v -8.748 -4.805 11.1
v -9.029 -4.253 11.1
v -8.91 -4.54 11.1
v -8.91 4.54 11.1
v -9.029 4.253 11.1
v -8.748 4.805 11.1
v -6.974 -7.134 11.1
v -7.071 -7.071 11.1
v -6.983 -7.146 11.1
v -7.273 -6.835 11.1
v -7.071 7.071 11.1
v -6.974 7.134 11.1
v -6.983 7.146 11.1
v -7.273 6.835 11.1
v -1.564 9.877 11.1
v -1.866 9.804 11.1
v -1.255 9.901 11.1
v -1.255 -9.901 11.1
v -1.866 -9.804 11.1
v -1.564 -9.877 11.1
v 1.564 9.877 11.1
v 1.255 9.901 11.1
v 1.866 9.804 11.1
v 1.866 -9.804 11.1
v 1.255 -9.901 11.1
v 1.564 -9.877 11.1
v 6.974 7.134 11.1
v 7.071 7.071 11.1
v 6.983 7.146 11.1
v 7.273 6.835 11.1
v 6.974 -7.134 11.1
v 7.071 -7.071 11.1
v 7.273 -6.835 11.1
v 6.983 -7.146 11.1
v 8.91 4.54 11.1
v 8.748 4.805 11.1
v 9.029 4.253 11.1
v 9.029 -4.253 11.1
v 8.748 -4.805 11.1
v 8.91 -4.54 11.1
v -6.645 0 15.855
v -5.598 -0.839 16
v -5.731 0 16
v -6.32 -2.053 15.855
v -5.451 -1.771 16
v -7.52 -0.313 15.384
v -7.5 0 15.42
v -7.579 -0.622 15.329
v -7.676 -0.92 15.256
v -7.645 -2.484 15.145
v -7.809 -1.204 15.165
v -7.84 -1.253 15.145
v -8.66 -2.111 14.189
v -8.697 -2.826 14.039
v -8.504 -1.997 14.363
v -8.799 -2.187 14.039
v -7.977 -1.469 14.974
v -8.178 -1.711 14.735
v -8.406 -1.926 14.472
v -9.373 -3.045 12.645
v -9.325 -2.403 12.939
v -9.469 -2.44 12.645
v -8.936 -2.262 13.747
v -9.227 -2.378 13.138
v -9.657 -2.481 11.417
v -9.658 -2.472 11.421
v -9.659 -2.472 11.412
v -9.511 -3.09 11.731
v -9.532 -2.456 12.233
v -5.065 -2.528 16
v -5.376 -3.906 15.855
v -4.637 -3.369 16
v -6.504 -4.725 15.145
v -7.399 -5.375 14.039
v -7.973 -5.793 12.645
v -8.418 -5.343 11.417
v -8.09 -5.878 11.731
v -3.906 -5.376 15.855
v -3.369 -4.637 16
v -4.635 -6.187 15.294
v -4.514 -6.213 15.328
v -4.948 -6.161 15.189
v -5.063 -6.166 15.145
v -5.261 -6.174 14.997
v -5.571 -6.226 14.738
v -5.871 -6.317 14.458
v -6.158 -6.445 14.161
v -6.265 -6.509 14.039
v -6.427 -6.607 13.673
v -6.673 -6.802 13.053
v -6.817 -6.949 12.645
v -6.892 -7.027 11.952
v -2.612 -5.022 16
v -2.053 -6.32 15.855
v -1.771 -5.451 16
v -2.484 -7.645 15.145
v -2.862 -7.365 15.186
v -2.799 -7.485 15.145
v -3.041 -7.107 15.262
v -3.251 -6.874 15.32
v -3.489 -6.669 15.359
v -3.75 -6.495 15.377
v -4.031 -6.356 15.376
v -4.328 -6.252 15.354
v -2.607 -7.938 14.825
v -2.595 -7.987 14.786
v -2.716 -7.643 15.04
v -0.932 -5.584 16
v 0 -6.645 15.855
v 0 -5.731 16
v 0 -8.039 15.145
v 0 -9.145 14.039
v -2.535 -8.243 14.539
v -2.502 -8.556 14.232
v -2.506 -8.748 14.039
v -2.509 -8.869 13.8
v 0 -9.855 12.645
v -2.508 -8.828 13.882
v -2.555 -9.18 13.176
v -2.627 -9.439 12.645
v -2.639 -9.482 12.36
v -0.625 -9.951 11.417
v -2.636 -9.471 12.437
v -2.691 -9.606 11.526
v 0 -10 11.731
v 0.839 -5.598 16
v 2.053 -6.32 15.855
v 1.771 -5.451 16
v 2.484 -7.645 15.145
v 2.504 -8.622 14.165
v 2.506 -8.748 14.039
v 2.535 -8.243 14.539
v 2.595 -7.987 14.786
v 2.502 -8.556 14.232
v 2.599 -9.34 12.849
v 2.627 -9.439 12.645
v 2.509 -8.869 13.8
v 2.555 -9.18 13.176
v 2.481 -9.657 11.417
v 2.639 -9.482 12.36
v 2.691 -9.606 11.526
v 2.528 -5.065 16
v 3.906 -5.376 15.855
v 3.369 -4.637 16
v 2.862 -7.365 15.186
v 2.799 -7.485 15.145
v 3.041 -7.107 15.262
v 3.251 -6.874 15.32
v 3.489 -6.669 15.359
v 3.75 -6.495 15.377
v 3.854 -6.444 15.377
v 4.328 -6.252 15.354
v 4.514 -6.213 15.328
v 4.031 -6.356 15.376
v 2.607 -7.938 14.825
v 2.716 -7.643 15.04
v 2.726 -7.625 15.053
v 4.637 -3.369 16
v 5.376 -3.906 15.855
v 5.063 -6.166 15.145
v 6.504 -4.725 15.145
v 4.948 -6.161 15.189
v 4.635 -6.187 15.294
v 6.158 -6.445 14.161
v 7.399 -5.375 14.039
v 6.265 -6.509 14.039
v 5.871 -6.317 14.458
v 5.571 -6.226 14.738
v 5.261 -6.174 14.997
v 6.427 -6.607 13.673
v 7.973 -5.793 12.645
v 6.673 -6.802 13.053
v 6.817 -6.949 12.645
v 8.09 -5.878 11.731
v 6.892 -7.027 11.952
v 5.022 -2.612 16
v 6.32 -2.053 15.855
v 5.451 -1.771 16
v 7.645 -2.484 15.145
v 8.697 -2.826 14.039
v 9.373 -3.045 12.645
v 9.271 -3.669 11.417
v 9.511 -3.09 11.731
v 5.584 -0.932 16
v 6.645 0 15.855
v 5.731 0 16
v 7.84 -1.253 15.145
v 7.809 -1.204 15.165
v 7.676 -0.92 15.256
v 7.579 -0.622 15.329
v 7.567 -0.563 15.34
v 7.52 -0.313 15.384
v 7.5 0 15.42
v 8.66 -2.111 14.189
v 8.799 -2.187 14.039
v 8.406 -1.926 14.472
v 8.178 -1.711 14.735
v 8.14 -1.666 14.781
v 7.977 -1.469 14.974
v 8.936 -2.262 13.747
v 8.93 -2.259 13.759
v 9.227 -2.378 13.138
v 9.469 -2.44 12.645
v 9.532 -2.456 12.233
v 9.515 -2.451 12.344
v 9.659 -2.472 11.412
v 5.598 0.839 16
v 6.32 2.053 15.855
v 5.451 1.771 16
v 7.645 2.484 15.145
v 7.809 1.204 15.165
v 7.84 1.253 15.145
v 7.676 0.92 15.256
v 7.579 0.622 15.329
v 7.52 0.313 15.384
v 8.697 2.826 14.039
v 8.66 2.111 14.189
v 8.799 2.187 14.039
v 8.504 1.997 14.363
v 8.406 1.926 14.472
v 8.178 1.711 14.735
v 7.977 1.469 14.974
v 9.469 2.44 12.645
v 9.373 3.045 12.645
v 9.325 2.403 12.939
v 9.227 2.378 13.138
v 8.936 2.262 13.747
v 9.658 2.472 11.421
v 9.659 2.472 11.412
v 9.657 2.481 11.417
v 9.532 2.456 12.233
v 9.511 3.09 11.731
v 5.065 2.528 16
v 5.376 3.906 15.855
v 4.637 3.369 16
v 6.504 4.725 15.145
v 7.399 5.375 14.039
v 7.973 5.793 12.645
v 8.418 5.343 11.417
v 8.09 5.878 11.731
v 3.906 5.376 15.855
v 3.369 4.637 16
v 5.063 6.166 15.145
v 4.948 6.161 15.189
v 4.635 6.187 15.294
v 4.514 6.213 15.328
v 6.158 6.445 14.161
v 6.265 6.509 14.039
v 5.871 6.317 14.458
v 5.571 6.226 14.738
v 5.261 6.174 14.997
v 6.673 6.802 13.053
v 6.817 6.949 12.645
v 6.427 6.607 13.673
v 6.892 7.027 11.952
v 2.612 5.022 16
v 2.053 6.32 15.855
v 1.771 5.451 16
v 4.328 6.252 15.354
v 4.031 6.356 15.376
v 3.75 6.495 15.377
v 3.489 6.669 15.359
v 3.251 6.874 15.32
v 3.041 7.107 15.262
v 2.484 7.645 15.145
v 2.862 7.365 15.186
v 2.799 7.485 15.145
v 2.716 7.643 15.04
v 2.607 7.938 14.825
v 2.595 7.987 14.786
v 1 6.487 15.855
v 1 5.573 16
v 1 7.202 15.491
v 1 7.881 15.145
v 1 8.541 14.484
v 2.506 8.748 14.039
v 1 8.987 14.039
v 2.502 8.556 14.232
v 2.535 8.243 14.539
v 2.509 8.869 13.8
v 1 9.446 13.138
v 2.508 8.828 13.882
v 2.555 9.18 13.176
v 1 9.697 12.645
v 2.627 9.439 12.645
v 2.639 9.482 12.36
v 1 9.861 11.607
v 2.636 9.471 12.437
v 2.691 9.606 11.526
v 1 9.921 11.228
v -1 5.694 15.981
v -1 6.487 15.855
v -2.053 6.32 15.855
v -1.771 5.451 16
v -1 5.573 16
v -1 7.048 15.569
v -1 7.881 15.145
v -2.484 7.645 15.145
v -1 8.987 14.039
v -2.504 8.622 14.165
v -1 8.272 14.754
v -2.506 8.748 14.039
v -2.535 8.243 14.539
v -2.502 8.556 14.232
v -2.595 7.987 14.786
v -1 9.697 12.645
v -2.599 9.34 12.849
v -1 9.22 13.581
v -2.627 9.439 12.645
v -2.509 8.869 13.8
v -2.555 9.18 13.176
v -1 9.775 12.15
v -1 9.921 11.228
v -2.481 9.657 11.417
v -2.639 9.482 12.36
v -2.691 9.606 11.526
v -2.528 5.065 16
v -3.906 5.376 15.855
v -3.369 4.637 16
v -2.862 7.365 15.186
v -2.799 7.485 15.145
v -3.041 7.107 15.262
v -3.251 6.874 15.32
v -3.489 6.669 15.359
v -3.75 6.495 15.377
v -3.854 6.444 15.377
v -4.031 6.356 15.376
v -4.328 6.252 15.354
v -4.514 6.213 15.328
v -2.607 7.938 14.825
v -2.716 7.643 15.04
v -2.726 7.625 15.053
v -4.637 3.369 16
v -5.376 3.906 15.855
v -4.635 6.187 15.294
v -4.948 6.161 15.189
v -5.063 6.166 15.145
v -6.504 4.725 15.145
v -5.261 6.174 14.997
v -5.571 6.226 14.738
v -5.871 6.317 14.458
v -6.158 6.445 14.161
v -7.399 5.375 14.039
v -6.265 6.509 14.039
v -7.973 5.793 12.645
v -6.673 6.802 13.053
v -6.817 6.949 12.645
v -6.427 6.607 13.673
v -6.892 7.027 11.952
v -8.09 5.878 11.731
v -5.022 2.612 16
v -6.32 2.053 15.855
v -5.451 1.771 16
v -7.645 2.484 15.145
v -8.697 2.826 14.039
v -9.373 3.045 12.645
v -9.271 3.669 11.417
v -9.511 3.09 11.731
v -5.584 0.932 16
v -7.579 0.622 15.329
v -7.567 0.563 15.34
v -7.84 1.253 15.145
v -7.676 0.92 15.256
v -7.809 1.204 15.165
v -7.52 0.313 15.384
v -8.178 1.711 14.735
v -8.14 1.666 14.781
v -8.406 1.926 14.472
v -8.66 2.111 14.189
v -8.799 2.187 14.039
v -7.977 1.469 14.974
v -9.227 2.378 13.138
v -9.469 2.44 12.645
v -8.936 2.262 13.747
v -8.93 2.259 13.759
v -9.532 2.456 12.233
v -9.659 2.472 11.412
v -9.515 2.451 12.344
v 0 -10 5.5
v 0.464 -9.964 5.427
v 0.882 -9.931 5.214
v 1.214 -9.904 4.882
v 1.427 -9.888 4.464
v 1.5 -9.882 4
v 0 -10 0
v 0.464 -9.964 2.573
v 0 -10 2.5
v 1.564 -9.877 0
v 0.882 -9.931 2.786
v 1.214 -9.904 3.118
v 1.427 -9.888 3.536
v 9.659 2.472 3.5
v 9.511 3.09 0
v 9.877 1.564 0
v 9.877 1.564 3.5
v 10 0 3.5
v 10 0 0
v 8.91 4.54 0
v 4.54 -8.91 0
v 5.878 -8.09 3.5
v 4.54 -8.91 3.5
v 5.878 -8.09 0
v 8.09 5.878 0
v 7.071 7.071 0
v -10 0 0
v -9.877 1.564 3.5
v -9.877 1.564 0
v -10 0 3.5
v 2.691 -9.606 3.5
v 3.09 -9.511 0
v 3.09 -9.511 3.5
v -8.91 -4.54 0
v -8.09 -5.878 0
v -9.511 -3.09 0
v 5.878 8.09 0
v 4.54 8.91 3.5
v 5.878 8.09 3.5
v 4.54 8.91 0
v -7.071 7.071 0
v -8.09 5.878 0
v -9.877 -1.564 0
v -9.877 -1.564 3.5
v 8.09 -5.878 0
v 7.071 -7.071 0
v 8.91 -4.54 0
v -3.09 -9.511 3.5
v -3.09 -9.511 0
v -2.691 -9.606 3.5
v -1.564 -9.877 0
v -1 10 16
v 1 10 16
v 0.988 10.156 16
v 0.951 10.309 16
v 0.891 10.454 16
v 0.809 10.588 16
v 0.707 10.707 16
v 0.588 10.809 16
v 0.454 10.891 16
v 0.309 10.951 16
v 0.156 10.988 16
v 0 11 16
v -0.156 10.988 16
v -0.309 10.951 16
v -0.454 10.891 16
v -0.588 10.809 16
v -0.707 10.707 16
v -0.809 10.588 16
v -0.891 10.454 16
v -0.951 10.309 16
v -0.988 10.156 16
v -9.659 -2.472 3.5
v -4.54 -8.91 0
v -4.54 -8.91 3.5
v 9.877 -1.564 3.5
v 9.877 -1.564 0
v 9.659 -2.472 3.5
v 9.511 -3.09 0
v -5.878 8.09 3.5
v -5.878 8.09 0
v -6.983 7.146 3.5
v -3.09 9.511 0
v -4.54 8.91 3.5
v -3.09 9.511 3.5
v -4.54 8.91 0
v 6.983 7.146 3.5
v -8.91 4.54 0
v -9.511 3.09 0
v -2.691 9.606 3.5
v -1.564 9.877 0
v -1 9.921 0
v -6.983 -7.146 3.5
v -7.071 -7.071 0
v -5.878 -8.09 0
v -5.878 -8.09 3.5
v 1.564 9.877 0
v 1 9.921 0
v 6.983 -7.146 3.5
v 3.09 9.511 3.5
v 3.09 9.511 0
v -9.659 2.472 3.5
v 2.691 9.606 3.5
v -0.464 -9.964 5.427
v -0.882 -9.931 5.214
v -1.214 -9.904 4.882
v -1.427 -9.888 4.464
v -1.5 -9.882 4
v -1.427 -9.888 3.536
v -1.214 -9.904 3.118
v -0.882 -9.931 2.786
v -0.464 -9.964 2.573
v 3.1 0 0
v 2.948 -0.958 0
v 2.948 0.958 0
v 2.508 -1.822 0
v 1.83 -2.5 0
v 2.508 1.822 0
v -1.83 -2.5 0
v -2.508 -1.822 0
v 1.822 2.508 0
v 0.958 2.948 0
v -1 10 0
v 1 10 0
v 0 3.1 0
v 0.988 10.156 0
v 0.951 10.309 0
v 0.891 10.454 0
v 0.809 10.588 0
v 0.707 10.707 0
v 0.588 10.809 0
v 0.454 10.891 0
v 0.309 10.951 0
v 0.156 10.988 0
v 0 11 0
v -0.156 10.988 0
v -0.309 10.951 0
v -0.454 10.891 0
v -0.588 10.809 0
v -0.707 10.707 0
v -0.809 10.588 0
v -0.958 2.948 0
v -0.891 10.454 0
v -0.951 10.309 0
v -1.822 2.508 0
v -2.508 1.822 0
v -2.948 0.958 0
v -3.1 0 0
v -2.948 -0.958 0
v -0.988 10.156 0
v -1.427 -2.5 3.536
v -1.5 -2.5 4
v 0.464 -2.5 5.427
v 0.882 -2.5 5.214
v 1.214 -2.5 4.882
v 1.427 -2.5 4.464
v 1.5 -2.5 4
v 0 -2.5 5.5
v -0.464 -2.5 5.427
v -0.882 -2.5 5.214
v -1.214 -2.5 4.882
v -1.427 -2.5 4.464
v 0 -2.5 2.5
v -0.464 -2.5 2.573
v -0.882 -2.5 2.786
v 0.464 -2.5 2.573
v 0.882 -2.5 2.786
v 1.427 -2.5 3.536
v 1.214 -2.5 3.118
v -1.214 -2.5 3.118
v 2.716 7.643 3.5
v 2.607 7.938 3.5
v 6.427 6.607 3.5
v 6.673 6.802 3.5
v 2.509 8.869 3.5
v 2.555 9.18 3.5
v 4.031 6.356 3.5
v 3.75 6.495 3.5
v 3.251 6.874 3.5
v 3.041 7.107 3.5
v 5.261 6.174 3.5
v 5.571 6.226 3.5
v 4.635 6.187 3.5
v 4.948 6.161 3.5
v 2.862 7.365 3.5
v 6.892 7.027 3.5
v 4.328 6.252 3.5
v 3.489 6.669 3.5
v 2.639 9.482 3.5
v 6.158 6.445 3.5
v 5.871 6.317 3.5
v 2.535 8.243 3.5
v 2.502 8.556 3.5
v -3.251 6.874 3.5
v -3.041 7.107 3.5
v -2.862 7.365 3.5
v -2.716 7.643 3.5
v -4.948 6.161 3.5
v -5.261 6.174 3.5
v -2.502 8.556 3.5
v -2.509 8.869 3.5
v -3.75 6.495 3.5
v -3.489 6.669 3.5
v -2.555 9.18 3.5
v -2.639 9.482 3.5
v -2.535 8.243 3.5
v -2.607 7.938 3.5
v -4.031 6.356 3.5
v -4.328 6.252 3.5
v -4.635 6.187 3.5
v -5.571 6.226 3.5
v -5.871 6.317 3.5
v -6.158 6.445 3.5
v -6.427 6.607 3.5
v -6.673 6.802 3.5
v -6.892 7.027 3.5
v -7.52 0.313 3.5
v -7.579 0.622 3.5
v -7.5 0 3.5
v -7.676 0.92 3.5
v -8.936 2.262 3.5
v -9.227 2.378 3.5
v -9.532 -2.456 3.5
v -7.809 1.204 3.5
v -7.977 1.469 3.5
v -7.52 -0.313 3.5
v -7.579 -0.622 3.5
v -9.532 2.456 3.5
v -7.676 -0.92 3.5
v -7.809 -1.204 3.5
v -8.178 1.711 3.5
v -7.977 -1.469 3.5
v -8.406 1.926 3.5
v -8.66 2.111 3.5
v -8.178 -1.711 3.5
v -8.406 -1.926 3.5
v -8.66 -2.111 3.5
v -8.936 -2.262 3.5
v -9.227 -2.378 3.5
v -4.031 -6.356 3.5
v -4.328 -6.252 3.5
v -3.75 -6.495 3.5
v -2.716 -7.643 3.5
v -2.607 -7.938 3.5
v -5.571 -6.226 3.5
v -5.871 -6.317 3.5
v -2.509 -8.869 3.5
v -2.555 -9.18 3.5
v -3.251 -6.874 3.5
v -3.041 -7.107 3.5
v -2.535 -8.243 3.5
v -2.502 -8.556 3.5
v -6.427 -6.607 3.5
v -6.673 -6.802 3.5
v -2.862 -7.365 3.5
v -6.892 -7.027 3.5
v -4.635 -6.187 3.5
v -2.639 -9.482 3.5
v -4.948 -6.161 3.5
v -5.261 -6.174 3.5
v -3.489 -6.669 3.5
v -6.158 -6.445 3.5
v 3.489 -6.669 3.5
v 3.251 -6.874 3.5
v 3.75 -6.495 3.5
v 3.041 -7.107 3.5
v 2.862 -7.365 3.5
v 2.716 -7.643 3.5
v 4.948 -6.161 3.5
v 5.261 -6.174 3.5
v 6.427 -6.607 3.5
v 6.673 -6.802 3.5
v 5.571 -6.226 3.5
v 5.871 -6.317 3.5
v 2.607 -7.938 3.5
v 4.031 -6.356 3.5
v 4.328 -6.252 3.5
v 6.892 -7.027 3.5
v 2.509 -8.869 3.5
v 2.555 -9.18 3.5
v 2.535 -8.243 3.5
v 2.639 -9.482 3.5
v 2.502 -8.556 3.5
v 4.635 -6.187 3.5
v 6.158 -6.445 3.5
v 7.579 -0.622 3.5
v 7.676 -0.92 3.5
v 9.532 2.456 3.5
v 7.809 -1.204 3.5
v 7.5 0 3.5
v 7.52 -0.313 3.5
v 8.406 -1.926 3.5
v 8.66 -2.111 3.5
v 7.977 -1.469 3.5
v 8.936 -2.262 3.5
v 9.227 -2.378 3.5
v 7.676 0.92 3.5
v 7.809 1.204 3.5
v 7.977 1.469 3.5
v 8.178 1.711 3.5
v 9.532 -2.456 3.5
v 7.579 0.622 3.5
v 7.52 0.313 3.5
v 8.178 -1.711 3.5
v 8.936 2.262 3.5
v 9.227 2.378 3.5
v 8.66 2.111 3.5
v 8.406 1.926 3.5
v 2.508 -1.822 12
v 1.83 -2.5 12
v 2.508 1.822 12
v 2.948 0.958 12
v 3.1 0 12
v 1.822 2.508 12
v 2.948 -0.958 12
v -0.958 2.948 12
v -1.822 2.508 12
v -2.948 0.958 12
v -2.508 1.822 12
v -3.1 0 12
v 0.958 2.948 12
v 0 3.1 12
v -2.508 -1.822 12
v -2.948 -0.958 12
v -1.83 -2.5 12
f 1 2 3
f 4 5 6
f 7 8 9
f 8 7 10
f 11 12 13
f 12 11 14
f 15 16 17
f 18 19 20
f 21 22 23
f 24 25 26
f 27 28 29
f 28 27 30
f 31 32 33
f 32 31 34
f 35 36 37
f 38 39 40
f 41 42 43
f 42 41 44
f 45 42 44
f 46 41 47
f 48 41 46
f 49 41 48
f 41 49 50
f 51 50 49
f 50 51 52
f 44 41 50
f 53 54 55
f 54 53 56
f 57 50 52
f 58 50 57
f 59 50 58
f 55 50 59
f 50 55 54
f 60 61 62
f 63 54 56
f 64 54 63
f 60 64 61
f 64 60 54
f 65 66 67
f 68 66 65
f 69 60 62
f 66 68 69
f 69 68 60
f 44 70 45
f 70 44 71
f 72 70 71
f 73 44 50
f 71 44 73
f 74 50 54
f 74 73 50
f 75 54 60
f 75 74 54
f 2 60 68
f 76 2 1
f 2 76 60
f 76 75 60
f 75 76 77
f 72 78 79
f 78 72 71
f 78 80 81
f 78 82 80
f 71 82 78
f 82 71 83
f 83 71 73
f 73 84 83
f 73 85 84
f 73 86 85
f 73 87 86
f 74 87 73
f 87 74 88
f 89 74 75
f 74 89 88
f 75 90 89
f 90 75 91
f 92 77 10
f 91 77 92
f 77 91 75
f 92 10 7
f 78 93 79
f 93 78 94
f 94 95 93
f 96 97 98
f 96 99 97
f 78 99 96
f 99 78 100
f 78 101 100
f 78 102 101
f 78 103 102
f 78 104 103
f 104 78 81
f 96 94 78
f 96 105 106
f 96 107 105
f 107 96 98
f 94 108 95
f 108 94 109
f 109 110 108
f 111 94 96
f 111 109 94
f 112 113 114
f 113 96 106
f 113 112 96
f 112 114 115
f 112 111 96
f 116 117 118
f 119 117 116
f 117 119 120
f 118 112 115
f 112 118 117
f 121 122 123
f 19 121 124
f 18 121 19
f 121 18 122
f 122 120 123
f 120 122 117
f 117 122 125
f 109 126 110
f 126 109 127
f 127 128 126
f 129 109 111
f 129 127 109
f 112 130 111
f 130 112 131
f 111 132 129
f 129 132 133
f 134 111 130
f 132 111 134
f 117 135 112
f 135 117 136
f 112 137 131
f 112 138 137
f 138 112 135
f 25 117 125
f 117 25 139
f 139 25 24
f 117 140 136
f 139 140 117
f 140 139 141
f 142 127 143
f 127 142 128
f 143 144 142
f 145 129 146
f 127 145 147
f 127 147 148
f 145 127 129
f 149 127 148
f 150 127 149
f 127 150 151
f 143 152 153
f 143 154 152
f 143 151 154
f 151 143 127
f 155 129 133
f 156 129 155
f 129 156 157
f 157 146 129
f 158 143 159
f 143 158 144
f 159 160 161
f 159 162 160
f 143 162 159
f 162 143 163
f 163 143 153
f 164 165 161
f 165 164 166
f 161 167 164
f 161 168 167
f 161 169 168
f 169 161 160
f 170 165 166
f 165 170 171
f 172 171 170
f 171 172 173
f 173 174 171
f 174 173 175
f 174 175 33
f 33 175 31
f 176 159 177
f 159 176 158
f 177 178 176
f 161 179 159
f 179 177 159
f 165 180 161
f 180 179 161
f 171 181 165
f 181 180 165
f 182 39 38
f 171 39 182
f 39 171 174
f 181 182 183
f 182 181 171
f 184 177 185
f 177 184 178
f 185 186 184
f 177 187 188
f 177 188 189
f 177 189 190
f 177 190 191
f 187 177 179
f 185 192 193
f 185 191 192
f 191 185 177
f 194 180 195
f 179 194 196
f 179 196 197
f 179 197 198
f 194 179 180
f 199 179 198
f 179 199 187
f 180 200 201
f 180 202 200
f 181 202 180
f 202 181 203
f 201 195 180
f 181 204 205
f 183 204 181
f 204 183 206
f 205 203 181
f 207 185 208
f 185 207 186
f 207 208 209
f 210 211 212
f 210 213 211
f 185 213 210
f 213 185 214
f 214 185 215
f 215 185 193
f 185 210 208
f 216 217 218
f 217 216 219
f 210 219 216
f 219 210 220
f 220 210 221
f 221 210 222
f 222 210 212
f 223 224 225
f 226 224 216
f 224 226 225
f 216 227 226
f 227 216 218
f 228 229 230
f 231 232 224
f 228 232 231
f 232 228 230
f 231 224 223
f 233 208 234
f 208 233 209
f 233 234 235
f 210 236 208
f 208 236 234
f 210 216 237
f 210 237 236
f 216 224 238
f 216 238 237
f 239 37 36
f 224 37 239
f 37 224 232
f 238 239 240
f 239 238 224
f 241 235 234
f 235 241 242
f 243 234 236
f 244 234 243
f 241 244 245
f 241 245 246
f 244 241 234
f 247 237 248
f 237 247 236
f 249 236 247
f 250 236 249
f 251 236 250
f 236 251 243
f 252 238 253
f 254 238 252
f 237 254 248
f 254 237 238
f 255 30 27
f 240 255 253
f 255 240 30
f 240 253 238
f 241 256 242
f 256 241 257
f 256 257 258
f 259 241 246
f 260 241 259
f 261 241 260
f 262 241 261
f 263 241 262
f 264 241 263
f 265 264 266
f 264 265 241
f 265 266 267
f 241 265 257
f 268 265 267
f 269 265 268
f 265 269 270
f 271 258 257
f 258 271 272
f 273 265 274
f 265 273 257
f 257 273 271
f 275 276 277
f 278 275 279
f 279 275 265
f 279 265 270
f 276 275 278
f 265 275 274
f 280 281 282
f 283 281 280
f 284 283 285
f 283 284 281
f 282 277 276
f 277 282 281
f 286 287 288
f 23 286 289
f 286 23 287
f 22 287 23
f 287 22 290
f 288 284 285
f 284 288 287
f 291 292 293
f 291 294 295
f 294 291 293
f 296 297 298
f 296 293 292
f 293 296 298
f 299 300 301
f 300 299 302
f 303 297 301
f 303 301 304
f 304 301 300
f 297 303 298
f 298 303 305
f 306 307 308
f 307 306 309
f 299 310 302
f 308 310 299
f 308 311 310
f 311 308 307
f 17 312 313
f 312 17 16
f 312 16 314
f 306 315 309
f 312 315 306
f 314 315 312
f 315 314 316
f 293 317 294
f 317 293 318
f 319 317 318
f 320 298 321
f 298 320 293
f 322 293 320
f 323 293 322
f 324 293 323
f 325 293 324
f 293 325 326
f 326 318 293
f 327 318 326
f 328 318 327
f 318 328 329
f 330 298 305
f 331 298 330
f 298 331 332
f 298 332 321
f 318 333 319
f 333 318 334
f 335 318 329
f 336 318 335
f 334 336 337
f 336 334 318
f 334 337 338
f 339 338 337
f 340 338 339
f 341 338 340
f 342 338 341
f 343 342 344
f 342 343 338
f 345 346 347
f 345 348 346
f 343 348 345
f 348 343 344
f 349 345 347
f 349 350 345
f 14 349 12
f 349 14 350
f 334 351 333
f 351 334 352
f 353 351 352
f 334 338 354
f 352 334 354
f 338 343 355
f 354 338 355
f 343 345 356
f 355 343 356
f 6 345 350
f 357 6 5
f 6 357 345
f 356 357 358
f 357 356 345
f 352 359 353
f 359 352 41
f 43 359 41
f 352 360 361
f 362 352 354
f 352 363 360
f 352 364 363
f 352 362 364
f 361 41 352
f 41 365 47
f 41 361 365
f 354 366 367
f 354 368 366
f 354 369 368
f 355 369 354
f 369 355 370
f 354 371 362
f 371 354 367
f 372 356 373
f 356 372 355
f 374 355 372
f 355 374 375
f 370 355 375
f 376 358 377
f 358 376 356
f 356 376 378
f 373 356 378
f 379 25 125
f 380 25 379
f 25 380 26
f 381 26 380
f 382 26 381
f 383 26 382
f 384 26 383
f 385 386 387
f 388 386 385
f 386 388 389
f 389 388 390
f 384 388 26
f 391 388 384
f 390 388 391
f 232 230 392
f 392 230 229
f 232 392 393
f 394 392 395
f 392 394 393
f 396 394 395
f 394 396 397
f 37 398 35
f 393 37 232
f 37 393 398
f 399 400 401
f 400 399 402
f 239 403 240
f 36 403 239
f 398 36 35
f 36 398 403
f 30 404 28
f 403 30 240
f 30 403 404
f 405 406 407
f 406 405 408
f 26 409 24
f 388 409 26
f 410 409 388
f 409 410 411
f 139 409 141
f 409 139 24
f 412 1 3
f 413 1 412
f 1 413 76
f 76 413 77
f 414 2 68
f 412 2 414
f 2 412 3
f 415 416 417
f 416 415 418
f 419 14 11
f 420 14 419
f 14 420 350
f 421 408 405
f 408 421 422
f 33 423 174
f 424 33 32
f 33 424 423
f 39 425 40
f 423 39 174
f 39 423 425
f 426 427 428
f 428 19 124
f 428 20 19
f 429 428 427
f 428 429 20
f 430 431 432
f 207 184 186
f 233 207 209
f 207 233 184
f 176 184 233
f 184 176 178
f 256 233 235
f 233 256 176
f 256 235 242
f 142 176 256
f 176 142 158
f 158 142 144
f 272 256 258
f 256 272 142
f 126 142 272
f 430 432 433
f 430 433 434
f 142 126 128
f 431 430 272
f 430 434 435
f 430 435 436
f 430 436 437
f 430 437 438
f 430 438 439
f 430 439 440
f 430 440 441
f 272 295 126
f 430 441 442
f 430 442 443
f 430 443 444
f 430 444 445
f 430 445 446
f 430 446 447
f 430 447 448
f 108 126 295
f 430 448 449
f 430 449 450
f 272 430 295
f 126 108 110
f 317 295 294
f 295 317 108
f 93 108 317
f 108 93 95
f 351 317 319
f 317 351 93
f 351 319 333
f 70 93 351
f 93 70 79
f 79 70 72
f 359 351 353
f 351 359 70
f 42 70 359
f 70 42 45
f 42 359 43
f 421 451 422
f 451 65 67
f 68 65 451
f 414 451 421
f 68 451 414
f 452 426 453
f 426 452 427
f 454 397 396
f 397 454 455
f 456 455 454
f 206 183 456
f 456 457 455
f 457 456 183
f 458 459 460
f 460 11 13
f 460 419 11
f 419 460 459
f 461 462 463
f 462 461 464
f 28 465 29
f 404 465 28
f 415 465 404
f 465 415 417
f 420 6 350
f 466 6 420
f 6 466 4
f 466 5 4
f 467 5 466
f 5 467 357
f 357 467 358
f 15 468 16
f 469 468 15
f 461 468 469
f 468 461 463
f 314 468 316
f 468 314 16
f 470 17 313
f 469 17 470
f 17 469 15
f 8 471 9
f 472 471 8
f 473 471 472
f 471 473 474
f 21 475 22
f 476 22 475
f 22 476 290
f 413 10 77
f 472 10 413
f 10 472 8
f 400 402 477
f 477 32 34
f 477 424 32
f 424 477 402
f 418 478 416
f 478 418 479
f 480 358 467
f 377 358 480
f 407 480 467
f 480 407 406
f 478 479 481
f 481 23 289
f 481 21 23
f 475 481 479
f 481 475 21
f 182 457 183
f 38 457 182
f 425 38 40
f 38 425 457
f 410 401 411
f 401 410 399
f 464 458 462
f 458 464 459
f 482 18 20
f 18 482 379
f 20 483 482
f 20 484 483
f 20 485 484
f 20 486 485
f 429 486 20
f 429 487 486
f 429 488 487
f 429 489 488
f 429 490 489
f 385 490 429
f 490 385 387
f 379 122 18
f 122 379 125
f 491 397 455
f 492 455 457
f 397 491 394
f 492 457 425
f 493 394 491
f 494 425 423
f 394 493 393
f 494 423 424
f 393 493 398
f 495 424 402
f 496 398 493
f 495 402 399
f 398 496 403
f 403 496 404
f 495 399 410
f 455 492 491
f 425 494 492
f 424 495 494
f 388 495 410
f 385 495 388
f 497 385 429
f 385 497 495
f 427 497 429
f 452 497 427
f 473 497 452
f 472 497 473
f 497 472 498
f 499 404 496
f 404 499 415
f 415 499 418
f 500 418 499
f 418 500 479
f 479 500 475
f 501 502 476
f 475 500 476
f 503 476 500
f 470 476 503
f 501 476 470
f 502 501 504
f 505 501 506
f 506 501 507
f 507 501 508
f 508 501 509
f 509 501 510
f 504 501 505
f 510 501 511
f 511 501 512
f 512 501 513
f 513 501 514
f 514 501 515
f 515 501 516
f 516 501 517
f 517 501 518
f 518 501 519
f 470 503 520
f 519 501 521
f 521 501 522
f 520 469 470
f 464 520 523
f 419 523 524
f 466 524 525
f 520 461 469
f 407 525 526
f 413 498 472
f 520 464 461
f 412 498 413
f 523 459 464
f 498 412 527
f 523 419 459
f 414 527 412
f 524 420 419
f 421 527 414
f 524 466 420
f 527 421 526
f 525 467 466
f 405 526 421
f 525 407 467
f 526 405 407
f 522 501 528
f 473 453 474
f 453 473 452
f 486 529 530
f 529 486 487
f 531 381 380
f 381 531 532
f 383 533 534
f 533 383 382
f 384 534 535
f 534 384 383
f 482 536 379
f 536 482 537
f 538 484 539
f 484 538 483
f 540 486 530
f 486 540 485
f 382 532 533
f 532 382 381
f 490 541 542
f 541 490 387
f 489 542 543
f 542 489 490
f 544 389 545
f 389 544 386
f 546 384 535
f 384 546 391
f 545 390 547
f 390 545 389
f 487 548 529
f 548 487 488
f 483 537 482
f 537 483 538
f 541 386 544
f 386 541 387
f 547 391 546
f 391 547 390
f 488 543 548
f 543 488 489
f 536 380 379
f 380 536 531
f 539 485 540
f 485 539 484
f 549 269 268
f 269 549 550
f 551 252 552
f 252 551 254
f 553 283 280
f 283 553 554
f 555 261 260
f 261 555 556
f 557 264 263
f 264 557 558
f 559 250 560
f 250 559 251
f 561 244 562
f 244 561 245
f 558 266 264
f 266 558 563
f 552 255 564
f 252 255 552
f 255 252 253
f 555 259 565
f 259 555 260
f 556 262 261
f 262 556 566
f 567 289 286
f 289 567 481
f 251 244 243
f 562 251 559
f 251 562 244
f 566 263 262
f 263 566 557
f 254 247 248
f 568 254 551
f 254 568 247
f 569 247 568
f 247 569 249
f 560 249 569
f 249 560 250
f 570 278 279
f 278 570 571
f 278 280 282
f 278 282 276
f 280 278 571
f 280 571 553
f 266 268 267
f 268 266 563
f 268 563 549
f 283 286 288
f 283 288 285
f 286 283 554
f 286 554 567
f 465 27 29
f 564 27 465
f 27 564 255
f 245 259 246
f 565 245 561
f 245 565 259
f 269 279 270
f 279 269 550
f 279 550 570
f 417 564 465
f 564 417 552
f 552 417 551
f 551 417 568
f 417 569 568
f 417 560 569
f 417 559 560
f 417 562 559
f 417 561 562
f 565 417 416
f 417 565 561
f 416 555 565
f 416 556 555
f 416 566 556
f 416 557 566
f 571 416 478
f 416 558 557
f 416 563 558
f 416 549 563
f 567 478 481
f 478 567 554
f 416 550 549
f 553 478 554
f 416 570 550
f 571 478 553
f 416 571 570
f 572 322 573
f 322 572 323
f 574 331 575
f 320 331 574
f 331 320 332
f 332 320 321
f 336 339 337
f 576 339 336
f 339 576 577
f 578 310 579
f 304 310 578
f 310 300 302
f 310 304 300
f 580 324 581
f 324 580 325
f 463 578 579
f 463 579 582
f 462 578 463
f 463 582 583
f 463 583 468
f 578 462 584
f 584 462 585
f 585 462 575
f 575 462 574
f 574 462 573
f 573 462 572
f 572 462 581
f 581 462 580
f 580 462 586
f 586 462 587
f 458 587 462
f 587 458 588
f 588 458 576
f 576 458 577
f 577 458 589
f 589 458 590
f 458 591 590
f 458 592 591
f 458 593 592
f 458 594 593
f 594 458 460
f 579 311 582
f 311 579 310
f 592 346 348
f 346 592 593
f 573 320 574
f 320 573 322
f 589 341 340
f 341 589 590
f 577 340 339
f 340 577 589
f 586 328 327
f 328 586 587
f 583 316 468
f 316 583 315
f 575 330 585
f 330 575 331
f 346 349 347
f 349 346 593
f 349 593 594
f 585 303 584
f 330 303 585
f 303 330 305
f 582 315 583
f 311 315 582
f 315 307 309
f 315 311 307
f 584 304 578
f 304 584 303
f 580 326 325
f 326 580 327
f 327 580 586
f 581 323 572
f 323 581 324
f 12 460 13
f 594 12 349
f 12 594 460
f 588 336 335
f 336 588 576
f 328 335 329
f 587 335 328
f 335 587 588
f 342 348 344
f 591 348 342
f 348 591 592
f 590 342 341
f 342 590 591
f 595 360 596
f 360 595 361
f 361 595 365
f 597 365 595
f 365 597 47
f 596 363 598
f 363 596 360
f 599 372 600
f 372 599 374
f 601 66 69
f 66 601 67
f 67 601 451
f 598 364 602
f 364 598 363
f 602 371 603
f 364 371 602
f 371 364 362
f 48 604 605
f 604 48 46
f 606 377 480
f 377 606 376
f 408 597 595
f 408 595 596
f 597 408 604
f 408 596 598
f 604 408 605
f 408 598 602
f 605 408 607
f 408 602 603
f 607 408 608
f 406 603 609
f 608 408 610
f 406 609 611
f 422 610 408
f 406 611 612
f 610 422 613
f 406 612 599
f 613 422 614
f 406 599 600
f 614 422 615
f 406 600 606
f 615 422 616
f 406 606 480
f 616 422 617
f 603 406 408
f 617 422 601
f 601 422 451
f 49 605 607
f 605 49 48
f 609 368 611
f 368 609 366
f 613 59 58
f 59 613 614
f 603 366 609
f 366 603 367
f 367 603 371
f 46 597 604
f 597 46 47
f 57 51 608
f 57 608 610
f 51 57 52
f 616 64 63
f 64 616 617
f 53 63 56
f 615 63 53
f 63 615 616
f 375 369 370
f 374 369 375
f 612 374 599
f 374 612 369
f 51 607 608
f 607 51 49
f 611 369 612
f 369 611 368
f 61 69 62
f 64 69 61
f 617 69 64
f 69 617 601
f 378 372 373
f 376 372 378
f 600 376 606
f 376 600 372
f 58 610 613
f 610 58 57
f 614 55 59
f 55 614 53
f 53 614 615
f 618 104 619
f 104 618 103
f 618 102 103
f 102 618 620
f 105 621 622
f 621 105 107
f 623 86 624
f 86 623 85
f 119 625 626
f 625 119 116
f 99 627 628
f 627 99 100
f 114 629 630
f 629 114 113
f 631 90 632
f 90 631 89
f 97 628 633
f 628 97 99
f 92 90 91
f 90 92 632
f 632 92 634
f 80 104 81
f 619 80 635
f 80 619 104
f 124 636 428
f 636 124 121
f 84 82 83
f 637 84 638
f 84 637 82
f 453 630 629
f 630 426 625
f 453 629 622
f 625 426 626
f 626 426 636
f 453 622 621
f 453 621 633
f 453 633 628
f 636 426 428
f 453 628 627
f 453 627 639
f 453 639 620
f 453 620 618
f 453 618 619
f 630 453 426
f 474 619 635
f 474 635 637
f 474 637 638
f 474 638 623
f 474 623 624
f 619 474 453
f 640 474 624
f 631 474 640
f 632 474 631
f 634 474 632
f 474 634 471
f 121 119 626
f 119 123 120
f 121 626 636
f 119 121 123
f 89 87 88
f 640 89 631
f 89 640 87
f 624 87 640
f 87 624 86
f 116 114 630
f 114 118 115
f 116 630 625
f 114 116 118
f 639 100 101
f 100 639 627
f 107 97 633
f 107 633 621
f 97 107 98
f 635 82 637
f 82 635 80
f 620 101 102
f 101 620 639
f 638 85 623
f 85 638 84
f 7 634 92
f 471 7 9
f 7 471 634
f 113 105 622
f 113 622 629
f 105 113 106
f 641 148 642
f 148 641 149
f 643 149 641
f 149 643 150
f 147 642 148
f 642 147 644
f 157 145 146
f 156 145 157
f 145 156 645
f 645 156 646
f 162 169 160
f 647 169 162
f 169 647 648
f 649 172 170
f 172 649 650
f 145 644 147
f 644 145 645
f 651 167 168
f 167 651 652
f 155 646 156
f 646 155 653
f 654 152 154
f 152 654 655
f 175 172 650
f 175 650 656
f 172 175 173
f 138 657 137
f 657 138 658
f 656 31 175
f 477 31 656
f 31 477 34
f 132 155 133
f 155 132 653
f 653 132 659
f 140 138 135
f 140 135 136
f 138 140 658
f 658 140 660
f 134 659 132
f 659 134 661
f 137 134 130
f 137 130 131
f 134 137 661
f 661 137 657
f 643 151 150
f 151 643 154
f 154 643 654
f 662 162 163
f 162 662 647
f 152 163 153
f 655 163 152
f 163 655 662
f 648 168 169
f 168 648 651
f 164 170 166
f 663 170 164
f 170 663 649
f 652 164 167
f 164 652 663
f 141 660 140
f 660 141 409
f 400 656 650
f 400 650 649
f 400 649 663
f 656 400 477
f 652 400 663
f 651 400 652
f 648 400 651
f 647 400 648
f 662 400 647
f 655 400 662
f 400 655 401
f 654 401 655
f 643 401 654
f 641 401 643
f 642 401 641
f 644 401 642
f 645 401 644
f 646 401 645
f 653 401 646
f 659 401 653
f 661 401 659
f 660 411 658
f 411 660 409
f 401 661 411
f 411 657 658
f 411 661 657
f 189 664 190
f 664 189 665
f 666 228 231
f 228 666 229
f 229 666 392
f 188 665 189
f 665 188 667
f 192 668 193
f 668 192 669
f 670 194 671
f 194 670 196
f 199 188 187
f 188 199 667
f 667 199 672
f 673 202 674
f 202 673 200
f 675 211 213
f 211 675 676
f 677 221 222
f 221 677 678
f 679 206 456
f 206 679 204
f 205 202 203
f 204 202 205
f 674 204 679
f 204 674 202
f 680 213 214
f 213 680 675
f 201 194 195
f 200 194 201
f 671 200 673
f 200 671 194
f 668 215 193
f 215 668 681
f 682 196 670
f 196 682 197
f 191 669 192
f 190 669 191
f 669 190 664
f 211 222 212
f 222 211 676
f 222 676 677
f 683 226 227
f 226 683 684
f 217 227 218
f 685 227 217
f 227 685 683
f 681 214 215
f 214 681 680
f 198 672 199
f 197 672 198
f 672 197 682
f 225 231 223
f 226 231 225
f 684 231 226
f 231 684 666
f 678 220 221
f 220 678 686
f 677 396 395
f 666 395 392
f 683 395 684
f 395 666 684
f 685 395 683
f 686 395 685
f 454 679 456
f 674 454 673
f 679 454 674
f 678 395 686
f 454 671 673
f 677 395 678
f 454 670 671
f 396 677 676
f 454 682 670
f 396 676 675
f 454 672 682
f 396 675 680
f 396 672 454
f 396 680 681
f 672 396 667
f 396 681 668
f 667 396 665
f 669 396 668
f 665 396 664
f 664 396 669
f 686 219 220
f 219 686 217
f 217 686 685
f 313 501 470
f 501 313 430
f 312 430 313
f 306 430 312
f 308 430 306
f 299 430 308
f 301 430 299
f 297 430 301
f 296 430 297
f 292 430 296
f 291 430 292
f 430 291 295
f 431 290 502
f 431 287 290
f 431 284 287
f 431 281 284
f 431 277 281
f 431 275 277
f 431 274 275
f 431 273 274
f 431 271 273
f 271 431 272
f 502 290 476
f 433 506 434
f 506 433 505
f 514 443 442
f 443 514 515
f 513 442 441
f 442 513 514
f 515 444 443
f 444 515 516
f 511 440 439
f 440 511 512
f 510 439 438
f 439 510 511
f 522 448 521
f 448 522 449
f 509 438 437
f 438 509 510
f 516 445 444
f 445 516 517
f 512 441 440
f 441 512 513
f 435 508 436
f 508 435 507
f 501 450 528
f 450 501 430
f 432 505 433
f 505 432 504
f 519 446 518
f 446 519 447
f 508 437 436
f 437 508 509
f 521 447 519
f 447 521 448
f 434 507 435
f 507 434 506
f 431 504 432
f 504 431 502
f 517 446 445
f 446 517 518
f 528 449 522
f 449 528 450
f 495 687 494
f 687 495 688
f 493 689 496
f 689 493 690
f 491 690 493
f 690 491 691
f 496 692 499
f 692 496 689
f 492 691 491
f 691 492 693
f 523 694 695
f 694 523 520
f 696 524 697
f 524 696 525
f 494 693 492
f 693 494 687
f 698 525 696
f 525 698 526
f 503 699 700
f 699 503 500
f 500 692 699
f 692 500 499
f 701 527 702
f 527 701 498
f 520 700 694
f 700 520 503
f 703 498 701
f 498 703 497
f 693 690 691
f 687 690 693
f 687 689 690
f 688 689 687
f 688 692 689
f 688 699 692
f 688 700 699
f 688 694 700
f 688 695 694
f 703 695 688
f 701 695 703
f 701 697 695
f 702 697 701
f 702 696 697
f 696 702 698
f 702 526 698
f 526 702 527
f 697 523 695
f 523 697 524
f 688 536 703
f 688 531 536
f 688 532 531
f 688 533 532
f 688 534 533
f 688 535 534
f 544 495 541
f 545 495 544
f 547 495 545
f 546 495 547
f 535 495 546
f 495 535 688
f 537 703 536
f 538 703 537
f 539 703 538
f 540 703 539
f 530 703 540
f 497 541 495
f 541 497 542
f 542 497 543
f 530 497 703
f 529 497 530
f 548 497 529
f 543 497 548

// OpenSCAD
/*

Parametric Potentiometer Knob Generator
version 1.4
2013 Steve Cooley
http://sc-fa.com
http://beatseqr.com
http://hapticsynapses.com

parametric potentiometer knob generator by steve cooley is licensed under a Creative Commons Attribution-NonCommercial-ShareAlike 3.0 Unported License. Based on a work at sc-fa.com. Permissions beyond the scope of this license may be available at http://sc-fa.com/blog/contact.

view terms of the license here:
http://creativecommons.org/licenses/by-nc-sa/3.0/


version history
---------------
1.4 2013-07-16 added an additive OR subtractive pill shaped indicator type
1.3 2013-04-01 updated for more awesome Thingiverse Customizer
1.2 2013-01-09 updated for Thingiverse Customizer
1.1 2012-04-12 fixed the arrow indicator code to be more robust and easier to adjust parameters for.
1.0 2012-03-?? initial release.


*/

/* [Physical attributes] */

// All values are in Millimeters!  How big the top of the knob is:
01_knob_diameter_top = 20; //[10:100]
knob_radius_top = 01_knob_diameter_top / 2;

// How big the bottom of the knob is:
02_knob_diameter_bottom = 20; // [10:100]
knob_radius_bottom = 02_knob_diameter_bottom / 2;

// how tall the knob is:
03_knob_height = 16; // [5:50]
knob_height = 03_knob_height / 1;

// how smooth or geometric the knob is:
04_knob_smoothness = 40; // [3:40]
knob_smoothness = 04_knob_smoothness / 1;

// (measure the potentiometer shaft with calipers and remember to add a bit for shrinkage.)
05_shaft_diameter = 6.2; // this could be a slider if precision were available
shaft_radius = 05_shaft_diameter / 2;

// how much of the shaft the knob should allow space inside for:
06_shaft_height = 13; // [1:40]
shaft_height = 06_shaft_height / 1;

// higher is smoother
07_shaft_smoothness = 20; // [3:20]
shaft_smoothness = 07_shaft_smoothness / 1;

// some potentiometers have a flat surface on the shaft to allow for the use of a set screw.
08_shaft_hole_is_flatted = "true"; // [true,false]

// ignore if no flat is needed.
09_shaft_hole_flat_size = 5.0; // this could be a slider if precision were available
flat_size = 09_shaft_hole_flat_size / 1;

/* [Set screw] */

// some potentiometers need to have their knobs affixed with a set screw.
10_set_screw = "true"; //[true,false]

// in MM:
11_set_screw_diameter = 3; // [0:8]
set_screw_radius = 11_set_screw_diameter / 2;

// how deep into the knob, from the side:
12_set_screw_depth = 9; // [0:20]
set_screw_depth = 12_set_screw_depth / 1;

// from the top:
13_set_screw_height = 4; // [0:20]
set_screw_height = 13_set_screw_height / 1;

// higher is smoother:
14_quality_of_set_screw = 20; // [0:20]
quality_of_set_screw = 14_quality_of_set_screw / 1;

/* [Decorations] */

// thanks to http://www.iheartrobotics.com/ for the articles!
15_top_edge_smoothing = "true"; // [true,false]

// how big of a smoothing radius to apply
16_top_edge_smoothing_radius = 5.0; // [1:10]
smoothing_radius = 16_top_edge_smoothing_radius / 1;

// Number of facets for the rounding cylinder
17_top_edge_smoothing_smoothness = 20.0; // [1:40]
smooth = 17_top_edge_smoothing_smoothness / 1;

ct = -0.1 / 1; 							// circle translate? not sure.
circle_radius = knob_radius_top / 1;  	// just match the top edge radius
circle_height = 1 / 1; 					// actually.. I don't know what this does.
pad = 0.2 / 1;							// Padding to maintain manifold



/* [External indicator] */

// this is a corner edge of a cube sticking out of the cylinder at the bottom, you can use it instead of the arrow shaped cutout in the top if you like. Or both.
18_pointy_external_indicator = "false"; // [true,false]


// how tall should the indicator be, from the bottom:
19_pointy_external_indicator_height = 3; // [1:50]
pointy_external_indicator_height = 19_pointy_external_indicator_height / 1;

// how far out the indicator should poke out:
20_pointy_external_indicator_pokey_outey_ness = 1.0;
pointy_external_indicator_pokey_outey_ness = 20_pointy_external_indicator_pokey_outey_ness * 1;

pokey_outey_value = pointy_external_indicator_pokey_outey_ness - 1 - pad;
pokey_outey = [pokey_outey_value, pokey_outey_value,0];

// there's an arrow shaped hole you can have. There aren't a lot of controls for this.
// please feel free to improve on this script here.

/* [Pill-shaped indicator] */

// there's an arrow shape you can have in the top of the knob.
00_pill_indicator = "true"; // [true,false]

// add or subtract the pill shape?
00_pill_add_or_subtract = "add"; // [add,subtract]

// relative scale of the pill shape:
00_pill_scale = 1.0;

// height of the pill shape:
00_pill_height = 16.0;

// relative scale of length of the pill shape:
00_pill_length = 2.5;

// where to put the arrow, x:
00_pill_location_x = 0.0;

// where to put the arrow, y:
00_pill_location_y = 5.0;

// where to put the arrow, z:
00_pill_location_z = 0.0;

pill_translate = [00_pill_location_x,00_pill_location_y,00_pill_location_z];


/* [Internal Arrow indicator] */

// there's an arrow shape you can have in the top of the knob.
21_top_of_knob_arrow_indicator = "false"; // [true,false]

// scale the arrow head:
22_arrow_head_scale = 2.0;
arrow_scale_head = 22_arrow_head_scale / 1;

// scale the arrow shaft:
23_arrow_shaft_scale = 1.5;
arrow_scale_shaft = 23_arrow_shaft_scale / 1;

// how big the overall arrow indicator should be:
24_arrow_indicator_scale = 1.3;
arrow_indicator_scale = 24_arrow_indicator_scale / 1;

// where to put the arrow, x:
25_arrow_location_x = 0.0;

// where to put the arrow, y:
26_arrow_location_y = 1.0;

// where to put the arrow, z:
27_arrow_location_z = 16.0;

arrow_indicator_translate = [25_arrow_location_x,26_arrow_location_y,27_arrow_location_z];



/* [Sphere Indentations] */

// for spherical indentations, set the quantity, quality, size, and adjust the placement
28_indentations_sphere = "false"; // [true,false]

29_sphere_number_of_indentations = 12; // [1:50]
sphere_number_of_indentations = 29_sphere_number_of_indentations / 1;

30_sphere_quality_of_indentations = 40; // [1:100]
sphere_quality_of_indentations = 30_sphere_quality_of_indentations / 1;

31_size_of_sphere_indentations = 4; // [1:20]
size_of_sphere_indentations = 31_size_of_sphere_indentations / 1;

// the first number in this set moves the spheres in or out. smaller is closer to the middle
32_sphere_indentation_location_x = 12.0;

// the second number in this set moves the spheres left or right
33_sphere_indentation_location_y = 00.0;

// the third number in this set moves the speheres up or down
34_sphere_indentation_location_z = 15.0;

translation_of_sphere_indentations = [32_sphere_indentation_location_x,33_sphere_indentation_location_y,34_sphere_indentation_location_z];

// in case you are using an odd number of indentations, you way want to adjust the starting angle so that they align to the front or set screw locations.
35_sphere_indentation_starting_rotation = 30; // [-90:90]
sphere_starting_rotation = 35_sphere_indentation_starting_rotation / 1 + 90;

/* [Cylinder Indentations] */

// for cylinder indentations, set quantity, quality, radius, height, and placement
36_indentations_cylinder = "true"; // [true,false]

37_number_of_cylinder_indentations = 6; // [1:40]
cylinder_number_of_indentations = 37_number_of_cylinder_indentations / 1;

// higher is smoother:
38_smoothness_of_cylinder_indentations = 50; // [3:100]
cylinder_quality_of_indentations = 38_smoothness_of_cylinder_indentations / 1;

39_diameter_of_top_of_the_cylinder = 5.0; // [1:20]
radius_of_cylinder_indentations_top = 39_diameter_of_top_of_the_cylinder / 2;

40_diameter_of_bottom_of_the_cylinder = 5.0;  // [1:20]
radius_of_cylinder_indentations_bottom = 40_diameter_of_bottom_of_the_cylinder / 2;

41_height_of_cylinder_indentations = 15.0; // [0:40]
height_of_cylinder_indentations = 41_height_of_cylinder_indentations / 1;

// this moves the cylinders in or out from the center
42_position_of_cylinder_x = -0.0; //[-20:20]

// this moves the cylinders left or right
43_position_of_cylinder_y = 0.0; //[-20:20]

// this moves the cylinders up or down
44_position_of_cylinder_z = -5.0; //[-20:20]

translation_of_cylinder_indentations = [42_position_of_cylinder_x,43_position_of_cylinder_y,44_position_of_cylinder_z];

45_cylinder_starting_rotation = -30; // [-90:90]
cylinder_starting_rotation = 45_cylinder_starting_rotation / 1 - 90;


// these are some setup variables... you probably won't need to mess with them.
negative_knob_radius = knob_radius_bottom*-1;


// this is the main module. It calls the submodules.
make_the_knob();

module make_the_knob()
{
difference()
{
	union()
	{
	difference()
		{
		difference()
			{
		
			difference() 
				{
				difference() 
					{
					
					union()
						{
						
						difference()
							{
							// main cylinder
							cylinder(r1=knob_radius_bottom,r2=knob_radius_top,h=knob_height, $fn=knob_smoothness);
							
							smoothing();				
		
							}
				
						external_direction_indicator();	
						}
					
					}
					
				set_screw_hole();
				}
			
			if(00_pill_add_or_subtract == "subtract")
				{
				pill();
				}
			arrow_indicator();
			indentations();
			}
		
	}
	if(00_pill_add_or_subtract == "add")
							{
							pill();
							}
	
	}
shaft_hole();
}

}
module smoothing() {

// smoothing the top
				if(15_top_edge_smoothing == "true")
					{		
						translate([0,0,knob_height])
						rotate([180,0,0])
						difference() {
							rotate_extrude(convexity=10,  $fn = smooth)
							translate([circle_radius-ct-smoothing_radius+pad,ct-pad,0])
							square(smoothing_radius+pad,smoothing_radius+pad);
	
							rotate_extrude(convexity=10,  $fn = smooth)
							translate([circle_radius-ct-smoothing_radius,ct+smoothing_radius,0])
							circle(r=smoothing_radius,$fn=smooth);
							}	
					}
}

module external_direction_indicator() {

				if(18_pointy_external_indicator == "true")
						{
						
						
						// outer pointy indicator
						rotate([0,0,45])
						translate(pokey_outey)
						// cube size of 8 minimum to point out
						cube(size=[knob_radius_bottom,knob_radius_bottom,pointy_external_indicator_height],center=false);
						}

}

module shaft_hole() {
				// shaft hole
				difference()
					{
					
					// round shaft hole
					translate([ 0, 0, -1 ]) 
					cylinder(r=shaft_radius,h=shaft_height, $fn=shaft_smoothness);
					
					if(08_shaft_hole_is_flatted  == "true")
						{
						// D shaft shape for shaft cutout
						rotate( [0,0,90]) 
						translate([-7.5,-5,0]) 
						cube(size=[flat_size,10,13],center=false);
						}
					}
}


module set_screw_hole() {

			if(10_set_screw == "true")
				{
				// set screw hole
				rotate ([90,0,0])
				translate([ 0, set_screw_height, 1 ])
				cylinder(r=set_screw_radius,h=set_screw_depth, $fn=quality_of_set_screw);
				}
}

module arrow_indicator() {
		if(21_top_of_knob_arrow_indicator == "true")
			{
			translate(arrow_indicator_translate)
			// begin arrow top cutout
			// translate([(knob_radius/2),knob_height,knob_height])
			rotate([90,0,45])
			scale([arrow_indicator_scale*.3,arrow_indicator_scale*.3,arrow_indicator_scale*.3])
			union()
				{			  
				rotate([90,45,0])
				scale([arrow_scale_head,arrow_scale_head,1])
				cylinder(r=8, h=10, $fn=3, center=true);
				rotate([90,45,0])
				translate([-10,0,0])
				scale([arrow_scale_shaft,arrow_scale_shaft,1])
				cube(size=[15,10,10],center=true);
				}
			}
}

module indentations() {

if(28_indentations_sphere == "true")
			{
			for (z = [0:sphere_number_of_indentations]) 
				{
				rotate([0,0,sphere_starting_rotation+((360/sphere_number_of_indentations)*z)])
				translate(translation_of_sphere_indentations)
				sphere(size_of_sphere_indentations, $fn=sphere_quality_of_indentations); 
				}
			}
if(36_indentations_cylinder == "true")
			{
			for (z = [0:cylinder_number_of_indentations]) 
				{
				rotate([0,0,cylinder_starting_rotation+((360/cylinder_number_of_indentations)*z)])
				
				translate([negative_knob_radius,0,knob_height])
				translate(translation_of_cylinder_indentations)
				cylinder(r1=radius_of_cylinder_indentations_bottom, r2=radius_of_cylinder_indentations_top, h=height_of_cylinder_indentations, center=true, $fn=cylinder_quality_of_indentations); 
				}
			}
		}

module pill()
{

if(00_pill_indicator == "true")
	{

	translate(pill_translate)

	rotate([0,0,90])
		{
		union()
			{
			cylinder(00_pill_height,00_pill_scale,00_pill_scale, $fn=40);
			translate([0,-00_pill_scale,0])
				{
					cube([(00_pill_scale*2)*00_pill_length,00_pill_scale*2,00_pill_height]);
				}
			translate([(00_pill_scale*2)*00_pill_length,0,0])
				{
					cylinder(00_pill_height,00_pill_scale,00_pill_scale, $fn=40);
				}
			}
		}
	}
}
